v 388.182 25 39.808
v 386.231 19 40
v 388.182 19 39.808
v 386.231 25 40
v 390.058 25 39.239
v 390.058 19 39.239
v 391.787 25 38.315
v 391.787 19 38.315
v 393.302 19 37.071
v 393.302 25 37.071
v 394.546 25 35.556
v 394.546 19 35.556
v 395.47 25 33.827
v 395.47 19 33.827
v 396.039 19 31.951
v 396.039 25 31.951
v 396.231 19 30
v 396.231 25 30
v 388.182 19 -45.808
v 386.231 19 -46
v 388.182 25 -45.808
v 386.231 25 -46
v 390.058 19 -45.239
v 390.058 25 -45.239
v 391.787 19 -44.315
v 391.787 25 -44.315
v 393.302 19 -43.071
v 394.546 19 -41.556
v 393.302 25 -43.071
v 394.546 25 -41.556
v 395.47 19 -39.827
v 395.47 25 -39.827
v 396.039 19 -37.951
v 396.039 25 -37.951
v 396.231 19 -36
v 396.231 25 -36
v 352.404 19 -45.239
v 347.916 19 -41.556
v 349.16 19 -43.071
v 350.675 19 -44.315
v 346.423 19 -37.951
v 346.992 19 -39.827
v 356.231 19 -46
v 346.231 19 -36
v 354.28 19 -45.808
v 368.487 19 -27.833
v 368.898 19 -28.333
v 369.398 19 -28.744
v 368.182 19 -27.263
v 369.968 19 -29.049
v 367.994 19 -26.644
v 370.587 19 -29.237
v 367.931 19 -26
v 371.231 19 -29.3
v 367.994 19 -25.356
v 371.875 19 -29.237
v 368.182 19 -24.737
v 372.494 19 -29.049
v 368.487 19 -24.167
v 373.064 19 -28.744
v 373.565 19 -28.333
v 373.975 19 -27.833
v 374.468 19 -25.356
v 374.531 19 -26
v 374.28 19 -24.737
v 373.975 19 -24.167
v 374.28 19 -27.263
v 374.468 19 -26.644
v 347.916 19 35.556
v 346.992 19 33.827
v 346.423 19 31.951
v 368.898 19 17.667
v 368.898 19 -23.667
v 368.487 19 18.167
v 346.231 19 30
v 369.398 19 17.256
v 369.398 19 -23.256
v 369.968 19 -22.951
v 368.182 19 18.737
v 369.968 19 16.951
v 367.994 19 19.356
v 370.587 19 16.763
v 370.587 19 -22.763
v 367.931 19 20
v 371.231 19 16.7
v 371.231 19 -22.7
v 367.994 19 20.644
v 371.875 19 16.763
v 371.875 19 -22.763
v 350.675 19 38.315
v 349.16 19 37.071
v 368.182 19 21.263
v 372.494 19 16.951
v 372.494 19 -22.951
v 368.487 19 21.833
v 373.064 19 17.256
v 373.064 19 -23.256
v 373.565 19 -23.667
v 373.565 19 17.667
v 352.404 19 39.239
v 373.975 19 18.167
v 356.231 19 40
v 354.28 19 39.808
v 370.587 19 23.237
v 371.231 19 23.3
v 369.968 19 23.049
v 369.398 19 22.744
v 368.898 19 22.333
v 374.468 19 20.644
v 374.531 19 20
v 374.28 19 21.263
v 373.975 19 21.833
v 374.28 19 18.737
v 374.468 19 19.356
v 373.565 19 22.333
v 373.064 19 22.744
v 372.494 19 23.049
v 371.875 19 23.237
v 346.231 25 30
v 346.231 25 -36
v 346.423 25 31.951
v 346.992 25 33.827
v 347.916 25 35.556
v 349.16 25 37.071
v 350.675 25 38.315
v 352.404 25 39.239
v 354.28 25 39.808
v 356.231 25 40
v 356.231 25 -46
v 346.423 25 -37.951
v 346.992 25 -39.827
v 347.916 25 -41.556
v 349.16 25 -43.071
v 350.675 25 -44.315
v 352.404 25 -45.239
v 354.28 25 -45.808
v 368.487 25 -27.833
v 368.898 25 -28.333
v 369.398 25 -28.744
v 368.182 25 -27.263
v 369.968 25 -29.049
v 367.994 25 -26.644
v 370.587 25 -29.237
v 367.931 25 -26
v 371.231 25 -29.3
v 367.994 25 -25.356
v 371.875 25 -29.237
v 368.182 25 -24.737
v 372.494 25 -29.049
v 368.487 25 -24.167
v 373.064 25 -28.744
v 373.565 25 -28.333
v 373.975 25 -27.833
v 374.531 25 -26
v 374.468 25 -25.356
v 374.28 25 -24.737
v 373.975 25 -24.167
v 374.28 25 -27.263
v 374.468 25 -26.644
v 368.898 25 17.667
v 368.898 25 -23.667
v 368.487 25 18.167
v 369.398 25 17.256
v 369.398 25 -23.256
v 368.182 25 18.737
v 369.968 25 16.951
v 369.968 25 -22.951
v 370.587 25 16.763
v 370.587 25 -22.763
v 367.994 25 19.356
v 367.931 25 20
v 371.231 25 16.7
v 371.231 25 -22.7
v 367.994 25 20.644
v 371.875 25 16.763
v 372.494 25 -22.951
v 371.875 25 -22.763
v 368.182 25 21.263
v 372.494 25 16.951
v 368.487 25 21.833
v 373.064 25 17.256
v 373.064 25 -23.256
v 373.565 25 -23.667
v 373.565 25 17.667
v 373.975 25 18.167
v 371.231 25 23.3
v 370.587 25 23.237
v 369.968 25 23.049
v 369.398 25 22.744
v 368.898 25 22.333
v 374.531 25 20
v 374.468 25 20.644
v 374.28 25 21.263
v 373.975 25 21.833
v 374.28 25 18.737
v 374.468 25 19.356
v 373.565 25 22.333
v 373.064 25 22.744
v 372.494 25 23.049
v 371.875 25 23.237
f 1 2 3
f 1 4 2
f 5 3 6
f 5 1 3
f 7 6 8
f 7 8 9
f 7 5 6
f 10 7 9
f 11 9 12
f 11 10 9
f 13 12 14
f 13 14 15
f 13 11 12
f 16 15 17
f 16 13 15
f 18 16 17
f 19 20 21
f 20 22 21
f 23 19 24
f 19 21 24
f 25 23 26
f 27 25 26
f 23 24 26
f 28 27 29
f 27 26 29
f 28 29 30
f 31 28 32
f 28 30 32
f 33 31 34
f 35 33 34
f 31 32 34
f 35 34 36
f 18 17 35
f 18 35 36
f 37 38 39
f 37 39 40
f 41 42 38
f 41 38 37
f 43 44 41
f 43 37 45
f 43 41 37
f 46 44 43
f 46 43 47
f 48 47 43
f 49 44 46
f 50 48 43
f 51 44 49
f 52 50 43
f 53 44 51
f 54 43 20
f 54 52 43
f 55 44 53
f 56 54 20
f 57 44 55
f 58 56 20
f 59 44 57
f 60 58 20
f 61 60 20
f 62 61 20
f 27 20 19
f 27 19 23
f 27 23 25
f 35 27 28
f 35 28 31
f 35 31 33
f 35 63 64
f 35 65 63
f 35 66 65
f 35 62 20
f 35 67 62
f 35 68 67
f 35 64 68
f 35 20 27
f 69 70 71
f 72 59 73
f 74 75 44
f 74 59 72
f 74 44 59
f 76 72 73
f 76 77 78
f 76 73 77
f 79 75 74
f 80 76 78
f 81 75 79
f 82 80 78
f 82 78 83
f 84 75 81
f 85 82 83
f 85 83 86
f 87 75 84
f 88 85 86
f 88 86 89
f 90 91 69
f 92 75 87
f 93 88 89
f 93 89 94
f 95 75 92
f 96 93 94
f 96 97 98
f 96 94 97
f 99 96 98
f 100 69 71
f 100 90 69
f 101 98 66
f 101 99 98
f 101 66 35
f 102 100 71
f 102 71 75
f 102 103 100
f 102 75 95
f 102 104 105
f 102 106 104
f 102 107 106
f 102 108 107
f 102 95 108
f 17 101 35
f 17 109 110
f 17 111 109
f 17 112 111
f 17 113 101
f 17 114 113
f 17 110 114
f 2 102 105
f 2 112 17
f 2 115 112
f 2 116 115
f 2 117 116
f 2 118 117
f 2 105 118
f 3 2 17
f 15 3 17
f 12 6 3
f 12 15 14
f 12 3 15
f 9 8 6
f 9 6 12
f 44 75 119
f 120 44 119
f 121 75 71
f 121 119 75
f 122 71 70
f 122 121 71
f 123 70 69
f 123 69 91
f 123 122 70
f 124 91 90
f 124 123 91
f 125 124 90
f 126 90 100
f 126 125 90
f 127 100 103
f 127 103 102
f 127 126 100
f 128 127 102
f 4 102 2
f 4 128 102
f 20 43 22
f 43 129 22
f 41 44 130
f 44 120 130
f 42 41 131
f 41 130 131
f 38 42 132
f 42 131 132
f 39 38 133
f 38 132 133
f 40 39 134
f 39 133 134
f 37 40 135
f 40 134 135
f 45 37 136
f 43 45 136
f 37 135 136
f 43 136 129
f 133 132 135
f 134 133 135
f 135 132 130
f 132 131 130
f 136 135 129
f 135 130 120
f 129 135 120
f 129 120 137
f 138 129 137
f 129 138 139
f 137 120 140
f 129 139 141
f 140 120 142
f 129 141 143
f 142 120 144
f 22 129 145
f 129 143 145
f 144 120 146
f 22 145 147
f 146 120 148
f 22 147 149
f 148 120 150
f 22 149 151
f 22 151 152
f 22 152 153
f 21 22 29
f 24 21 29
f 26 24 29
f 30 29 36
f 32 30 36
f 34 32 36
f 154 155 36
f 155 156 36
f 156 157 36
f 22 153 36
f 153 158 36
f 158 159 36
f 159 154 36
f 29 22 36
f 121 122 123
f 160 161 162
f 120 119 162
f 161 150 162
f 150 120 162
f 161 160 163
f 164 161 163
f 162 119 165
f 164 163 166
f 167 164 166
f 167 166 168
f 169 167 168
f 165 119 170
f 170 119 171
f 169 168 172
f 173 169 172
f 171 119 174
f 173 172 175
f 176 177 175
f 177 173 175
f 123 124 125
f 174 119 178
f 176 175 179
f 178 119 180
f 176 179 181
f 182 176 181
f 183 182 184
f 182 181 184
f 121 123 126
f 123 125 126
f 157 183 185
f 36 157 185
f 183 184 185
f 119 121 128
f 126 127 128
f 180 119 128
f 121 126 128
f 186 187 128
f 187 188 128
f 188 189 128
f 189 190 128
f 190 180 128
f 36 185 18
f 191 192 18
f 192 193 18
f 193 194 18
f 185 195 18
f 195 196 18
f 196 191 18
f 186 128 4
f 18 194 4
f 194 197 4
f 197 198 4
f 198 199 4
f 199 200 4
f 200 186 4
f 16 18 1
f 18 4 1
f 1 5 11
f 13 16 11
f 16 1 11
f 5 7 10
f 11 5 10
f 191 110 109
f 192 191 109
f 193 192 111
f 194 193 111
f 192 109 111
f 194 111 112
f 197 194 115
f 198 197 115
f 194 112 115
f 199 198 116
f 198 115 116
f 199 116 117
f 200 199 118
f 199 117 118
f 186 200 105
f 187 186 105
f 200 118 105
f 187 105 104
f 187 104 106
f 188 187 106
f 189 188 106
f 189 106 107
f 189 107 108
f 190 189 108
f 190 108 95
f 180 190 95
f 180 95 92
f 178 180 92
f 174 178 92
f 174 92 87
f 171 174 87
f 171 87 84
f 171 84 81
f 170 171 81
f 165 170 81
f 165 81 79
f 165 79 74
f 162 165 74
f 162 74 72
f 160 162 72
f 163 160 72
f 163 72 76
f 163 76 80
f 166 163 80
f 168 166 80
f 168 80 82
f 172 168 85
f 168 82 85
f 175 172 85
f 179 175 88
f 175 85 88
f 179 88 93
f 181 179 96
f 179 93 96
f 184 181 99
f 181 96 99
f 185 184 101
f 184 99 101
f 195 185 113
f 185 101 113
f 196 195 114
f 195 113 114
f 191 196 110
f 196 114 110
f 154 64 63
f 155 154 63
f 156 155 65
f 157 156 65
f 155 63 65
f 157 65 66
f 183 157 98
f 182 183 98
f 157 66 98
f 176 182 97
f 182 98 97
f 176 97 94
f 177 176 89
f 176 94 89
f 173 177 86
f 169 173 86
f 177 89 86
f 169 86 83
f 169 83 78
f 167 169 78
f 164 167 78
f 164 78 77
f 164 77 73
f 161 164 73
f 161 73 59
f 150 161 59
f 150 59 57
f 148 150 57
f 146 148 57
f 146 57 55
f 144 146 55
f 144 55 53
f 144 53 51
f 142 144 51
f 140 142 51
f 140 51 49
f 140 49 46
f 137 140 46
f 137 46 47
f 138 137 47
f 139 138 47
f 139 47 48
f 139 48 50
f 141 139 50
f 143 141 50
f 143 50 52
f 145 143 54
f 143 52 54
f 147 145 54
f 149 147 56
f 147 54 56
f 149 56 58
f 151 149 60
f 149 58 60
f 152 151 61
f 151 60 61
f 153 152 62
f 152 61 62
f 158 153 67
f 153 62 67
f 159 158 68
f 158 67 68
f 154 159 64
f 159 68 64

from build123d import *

# Parameters (mm, degrees)
SKETCH1_W                = 50
SKETCH1_H                = 6
BOSS_EXTRUDE1_DEPTH      = 40
BOSS_EXTRUDE1_DEPTH_BACK = 46
SKETCH2_R                = 3.3
CUT_EXTRUDE1_DEPTH       = 7
FILLET1_R                = 10


with BuildPart() as part:
    # Sketch1 → Boss-Extrude1 (new body, two sides)
    with BuildSketch(Plane.XY) as boss_extrude1_sk:
        with Locations((371.231060123, 22)):
            Rectangle(SKETCH1_W, SKETCH1_H)
    extrude(amount=BOSS_EXTRUDE1_DEPTH)
    extrude(boss_extrude1_sk.sketch, amount=-BOSS_EXTRUDE1_DEPTH_BACK)

    # Sketch2 → Cut-Extrude1 (cut, through all)
    with BuildSketch(Plane.XZ.offset(-19)):
        with Locations((371.231060123, -26)):
            Circle(SKETCH2_R)
        with Locations((371.231060123, 20)):
            Circle(SKETCH2_R)
    extrude(amount=-CUT_EXTRUDE1_DEPTH, mode=Mode.SUBTRACT)

    # Fillet1
    fillet1_edges = [part.edges().sort_by_distance(p)[0] for p in [
        (396.231060123, 22, -46),
        (346.231060123, 22, 40),
        (396.231060123, 22, 40),
        (346.231060123, 22, -46),
    ]]
    fillet(fillet1_edges, radius=FILLET1_R)


solid = part.part
